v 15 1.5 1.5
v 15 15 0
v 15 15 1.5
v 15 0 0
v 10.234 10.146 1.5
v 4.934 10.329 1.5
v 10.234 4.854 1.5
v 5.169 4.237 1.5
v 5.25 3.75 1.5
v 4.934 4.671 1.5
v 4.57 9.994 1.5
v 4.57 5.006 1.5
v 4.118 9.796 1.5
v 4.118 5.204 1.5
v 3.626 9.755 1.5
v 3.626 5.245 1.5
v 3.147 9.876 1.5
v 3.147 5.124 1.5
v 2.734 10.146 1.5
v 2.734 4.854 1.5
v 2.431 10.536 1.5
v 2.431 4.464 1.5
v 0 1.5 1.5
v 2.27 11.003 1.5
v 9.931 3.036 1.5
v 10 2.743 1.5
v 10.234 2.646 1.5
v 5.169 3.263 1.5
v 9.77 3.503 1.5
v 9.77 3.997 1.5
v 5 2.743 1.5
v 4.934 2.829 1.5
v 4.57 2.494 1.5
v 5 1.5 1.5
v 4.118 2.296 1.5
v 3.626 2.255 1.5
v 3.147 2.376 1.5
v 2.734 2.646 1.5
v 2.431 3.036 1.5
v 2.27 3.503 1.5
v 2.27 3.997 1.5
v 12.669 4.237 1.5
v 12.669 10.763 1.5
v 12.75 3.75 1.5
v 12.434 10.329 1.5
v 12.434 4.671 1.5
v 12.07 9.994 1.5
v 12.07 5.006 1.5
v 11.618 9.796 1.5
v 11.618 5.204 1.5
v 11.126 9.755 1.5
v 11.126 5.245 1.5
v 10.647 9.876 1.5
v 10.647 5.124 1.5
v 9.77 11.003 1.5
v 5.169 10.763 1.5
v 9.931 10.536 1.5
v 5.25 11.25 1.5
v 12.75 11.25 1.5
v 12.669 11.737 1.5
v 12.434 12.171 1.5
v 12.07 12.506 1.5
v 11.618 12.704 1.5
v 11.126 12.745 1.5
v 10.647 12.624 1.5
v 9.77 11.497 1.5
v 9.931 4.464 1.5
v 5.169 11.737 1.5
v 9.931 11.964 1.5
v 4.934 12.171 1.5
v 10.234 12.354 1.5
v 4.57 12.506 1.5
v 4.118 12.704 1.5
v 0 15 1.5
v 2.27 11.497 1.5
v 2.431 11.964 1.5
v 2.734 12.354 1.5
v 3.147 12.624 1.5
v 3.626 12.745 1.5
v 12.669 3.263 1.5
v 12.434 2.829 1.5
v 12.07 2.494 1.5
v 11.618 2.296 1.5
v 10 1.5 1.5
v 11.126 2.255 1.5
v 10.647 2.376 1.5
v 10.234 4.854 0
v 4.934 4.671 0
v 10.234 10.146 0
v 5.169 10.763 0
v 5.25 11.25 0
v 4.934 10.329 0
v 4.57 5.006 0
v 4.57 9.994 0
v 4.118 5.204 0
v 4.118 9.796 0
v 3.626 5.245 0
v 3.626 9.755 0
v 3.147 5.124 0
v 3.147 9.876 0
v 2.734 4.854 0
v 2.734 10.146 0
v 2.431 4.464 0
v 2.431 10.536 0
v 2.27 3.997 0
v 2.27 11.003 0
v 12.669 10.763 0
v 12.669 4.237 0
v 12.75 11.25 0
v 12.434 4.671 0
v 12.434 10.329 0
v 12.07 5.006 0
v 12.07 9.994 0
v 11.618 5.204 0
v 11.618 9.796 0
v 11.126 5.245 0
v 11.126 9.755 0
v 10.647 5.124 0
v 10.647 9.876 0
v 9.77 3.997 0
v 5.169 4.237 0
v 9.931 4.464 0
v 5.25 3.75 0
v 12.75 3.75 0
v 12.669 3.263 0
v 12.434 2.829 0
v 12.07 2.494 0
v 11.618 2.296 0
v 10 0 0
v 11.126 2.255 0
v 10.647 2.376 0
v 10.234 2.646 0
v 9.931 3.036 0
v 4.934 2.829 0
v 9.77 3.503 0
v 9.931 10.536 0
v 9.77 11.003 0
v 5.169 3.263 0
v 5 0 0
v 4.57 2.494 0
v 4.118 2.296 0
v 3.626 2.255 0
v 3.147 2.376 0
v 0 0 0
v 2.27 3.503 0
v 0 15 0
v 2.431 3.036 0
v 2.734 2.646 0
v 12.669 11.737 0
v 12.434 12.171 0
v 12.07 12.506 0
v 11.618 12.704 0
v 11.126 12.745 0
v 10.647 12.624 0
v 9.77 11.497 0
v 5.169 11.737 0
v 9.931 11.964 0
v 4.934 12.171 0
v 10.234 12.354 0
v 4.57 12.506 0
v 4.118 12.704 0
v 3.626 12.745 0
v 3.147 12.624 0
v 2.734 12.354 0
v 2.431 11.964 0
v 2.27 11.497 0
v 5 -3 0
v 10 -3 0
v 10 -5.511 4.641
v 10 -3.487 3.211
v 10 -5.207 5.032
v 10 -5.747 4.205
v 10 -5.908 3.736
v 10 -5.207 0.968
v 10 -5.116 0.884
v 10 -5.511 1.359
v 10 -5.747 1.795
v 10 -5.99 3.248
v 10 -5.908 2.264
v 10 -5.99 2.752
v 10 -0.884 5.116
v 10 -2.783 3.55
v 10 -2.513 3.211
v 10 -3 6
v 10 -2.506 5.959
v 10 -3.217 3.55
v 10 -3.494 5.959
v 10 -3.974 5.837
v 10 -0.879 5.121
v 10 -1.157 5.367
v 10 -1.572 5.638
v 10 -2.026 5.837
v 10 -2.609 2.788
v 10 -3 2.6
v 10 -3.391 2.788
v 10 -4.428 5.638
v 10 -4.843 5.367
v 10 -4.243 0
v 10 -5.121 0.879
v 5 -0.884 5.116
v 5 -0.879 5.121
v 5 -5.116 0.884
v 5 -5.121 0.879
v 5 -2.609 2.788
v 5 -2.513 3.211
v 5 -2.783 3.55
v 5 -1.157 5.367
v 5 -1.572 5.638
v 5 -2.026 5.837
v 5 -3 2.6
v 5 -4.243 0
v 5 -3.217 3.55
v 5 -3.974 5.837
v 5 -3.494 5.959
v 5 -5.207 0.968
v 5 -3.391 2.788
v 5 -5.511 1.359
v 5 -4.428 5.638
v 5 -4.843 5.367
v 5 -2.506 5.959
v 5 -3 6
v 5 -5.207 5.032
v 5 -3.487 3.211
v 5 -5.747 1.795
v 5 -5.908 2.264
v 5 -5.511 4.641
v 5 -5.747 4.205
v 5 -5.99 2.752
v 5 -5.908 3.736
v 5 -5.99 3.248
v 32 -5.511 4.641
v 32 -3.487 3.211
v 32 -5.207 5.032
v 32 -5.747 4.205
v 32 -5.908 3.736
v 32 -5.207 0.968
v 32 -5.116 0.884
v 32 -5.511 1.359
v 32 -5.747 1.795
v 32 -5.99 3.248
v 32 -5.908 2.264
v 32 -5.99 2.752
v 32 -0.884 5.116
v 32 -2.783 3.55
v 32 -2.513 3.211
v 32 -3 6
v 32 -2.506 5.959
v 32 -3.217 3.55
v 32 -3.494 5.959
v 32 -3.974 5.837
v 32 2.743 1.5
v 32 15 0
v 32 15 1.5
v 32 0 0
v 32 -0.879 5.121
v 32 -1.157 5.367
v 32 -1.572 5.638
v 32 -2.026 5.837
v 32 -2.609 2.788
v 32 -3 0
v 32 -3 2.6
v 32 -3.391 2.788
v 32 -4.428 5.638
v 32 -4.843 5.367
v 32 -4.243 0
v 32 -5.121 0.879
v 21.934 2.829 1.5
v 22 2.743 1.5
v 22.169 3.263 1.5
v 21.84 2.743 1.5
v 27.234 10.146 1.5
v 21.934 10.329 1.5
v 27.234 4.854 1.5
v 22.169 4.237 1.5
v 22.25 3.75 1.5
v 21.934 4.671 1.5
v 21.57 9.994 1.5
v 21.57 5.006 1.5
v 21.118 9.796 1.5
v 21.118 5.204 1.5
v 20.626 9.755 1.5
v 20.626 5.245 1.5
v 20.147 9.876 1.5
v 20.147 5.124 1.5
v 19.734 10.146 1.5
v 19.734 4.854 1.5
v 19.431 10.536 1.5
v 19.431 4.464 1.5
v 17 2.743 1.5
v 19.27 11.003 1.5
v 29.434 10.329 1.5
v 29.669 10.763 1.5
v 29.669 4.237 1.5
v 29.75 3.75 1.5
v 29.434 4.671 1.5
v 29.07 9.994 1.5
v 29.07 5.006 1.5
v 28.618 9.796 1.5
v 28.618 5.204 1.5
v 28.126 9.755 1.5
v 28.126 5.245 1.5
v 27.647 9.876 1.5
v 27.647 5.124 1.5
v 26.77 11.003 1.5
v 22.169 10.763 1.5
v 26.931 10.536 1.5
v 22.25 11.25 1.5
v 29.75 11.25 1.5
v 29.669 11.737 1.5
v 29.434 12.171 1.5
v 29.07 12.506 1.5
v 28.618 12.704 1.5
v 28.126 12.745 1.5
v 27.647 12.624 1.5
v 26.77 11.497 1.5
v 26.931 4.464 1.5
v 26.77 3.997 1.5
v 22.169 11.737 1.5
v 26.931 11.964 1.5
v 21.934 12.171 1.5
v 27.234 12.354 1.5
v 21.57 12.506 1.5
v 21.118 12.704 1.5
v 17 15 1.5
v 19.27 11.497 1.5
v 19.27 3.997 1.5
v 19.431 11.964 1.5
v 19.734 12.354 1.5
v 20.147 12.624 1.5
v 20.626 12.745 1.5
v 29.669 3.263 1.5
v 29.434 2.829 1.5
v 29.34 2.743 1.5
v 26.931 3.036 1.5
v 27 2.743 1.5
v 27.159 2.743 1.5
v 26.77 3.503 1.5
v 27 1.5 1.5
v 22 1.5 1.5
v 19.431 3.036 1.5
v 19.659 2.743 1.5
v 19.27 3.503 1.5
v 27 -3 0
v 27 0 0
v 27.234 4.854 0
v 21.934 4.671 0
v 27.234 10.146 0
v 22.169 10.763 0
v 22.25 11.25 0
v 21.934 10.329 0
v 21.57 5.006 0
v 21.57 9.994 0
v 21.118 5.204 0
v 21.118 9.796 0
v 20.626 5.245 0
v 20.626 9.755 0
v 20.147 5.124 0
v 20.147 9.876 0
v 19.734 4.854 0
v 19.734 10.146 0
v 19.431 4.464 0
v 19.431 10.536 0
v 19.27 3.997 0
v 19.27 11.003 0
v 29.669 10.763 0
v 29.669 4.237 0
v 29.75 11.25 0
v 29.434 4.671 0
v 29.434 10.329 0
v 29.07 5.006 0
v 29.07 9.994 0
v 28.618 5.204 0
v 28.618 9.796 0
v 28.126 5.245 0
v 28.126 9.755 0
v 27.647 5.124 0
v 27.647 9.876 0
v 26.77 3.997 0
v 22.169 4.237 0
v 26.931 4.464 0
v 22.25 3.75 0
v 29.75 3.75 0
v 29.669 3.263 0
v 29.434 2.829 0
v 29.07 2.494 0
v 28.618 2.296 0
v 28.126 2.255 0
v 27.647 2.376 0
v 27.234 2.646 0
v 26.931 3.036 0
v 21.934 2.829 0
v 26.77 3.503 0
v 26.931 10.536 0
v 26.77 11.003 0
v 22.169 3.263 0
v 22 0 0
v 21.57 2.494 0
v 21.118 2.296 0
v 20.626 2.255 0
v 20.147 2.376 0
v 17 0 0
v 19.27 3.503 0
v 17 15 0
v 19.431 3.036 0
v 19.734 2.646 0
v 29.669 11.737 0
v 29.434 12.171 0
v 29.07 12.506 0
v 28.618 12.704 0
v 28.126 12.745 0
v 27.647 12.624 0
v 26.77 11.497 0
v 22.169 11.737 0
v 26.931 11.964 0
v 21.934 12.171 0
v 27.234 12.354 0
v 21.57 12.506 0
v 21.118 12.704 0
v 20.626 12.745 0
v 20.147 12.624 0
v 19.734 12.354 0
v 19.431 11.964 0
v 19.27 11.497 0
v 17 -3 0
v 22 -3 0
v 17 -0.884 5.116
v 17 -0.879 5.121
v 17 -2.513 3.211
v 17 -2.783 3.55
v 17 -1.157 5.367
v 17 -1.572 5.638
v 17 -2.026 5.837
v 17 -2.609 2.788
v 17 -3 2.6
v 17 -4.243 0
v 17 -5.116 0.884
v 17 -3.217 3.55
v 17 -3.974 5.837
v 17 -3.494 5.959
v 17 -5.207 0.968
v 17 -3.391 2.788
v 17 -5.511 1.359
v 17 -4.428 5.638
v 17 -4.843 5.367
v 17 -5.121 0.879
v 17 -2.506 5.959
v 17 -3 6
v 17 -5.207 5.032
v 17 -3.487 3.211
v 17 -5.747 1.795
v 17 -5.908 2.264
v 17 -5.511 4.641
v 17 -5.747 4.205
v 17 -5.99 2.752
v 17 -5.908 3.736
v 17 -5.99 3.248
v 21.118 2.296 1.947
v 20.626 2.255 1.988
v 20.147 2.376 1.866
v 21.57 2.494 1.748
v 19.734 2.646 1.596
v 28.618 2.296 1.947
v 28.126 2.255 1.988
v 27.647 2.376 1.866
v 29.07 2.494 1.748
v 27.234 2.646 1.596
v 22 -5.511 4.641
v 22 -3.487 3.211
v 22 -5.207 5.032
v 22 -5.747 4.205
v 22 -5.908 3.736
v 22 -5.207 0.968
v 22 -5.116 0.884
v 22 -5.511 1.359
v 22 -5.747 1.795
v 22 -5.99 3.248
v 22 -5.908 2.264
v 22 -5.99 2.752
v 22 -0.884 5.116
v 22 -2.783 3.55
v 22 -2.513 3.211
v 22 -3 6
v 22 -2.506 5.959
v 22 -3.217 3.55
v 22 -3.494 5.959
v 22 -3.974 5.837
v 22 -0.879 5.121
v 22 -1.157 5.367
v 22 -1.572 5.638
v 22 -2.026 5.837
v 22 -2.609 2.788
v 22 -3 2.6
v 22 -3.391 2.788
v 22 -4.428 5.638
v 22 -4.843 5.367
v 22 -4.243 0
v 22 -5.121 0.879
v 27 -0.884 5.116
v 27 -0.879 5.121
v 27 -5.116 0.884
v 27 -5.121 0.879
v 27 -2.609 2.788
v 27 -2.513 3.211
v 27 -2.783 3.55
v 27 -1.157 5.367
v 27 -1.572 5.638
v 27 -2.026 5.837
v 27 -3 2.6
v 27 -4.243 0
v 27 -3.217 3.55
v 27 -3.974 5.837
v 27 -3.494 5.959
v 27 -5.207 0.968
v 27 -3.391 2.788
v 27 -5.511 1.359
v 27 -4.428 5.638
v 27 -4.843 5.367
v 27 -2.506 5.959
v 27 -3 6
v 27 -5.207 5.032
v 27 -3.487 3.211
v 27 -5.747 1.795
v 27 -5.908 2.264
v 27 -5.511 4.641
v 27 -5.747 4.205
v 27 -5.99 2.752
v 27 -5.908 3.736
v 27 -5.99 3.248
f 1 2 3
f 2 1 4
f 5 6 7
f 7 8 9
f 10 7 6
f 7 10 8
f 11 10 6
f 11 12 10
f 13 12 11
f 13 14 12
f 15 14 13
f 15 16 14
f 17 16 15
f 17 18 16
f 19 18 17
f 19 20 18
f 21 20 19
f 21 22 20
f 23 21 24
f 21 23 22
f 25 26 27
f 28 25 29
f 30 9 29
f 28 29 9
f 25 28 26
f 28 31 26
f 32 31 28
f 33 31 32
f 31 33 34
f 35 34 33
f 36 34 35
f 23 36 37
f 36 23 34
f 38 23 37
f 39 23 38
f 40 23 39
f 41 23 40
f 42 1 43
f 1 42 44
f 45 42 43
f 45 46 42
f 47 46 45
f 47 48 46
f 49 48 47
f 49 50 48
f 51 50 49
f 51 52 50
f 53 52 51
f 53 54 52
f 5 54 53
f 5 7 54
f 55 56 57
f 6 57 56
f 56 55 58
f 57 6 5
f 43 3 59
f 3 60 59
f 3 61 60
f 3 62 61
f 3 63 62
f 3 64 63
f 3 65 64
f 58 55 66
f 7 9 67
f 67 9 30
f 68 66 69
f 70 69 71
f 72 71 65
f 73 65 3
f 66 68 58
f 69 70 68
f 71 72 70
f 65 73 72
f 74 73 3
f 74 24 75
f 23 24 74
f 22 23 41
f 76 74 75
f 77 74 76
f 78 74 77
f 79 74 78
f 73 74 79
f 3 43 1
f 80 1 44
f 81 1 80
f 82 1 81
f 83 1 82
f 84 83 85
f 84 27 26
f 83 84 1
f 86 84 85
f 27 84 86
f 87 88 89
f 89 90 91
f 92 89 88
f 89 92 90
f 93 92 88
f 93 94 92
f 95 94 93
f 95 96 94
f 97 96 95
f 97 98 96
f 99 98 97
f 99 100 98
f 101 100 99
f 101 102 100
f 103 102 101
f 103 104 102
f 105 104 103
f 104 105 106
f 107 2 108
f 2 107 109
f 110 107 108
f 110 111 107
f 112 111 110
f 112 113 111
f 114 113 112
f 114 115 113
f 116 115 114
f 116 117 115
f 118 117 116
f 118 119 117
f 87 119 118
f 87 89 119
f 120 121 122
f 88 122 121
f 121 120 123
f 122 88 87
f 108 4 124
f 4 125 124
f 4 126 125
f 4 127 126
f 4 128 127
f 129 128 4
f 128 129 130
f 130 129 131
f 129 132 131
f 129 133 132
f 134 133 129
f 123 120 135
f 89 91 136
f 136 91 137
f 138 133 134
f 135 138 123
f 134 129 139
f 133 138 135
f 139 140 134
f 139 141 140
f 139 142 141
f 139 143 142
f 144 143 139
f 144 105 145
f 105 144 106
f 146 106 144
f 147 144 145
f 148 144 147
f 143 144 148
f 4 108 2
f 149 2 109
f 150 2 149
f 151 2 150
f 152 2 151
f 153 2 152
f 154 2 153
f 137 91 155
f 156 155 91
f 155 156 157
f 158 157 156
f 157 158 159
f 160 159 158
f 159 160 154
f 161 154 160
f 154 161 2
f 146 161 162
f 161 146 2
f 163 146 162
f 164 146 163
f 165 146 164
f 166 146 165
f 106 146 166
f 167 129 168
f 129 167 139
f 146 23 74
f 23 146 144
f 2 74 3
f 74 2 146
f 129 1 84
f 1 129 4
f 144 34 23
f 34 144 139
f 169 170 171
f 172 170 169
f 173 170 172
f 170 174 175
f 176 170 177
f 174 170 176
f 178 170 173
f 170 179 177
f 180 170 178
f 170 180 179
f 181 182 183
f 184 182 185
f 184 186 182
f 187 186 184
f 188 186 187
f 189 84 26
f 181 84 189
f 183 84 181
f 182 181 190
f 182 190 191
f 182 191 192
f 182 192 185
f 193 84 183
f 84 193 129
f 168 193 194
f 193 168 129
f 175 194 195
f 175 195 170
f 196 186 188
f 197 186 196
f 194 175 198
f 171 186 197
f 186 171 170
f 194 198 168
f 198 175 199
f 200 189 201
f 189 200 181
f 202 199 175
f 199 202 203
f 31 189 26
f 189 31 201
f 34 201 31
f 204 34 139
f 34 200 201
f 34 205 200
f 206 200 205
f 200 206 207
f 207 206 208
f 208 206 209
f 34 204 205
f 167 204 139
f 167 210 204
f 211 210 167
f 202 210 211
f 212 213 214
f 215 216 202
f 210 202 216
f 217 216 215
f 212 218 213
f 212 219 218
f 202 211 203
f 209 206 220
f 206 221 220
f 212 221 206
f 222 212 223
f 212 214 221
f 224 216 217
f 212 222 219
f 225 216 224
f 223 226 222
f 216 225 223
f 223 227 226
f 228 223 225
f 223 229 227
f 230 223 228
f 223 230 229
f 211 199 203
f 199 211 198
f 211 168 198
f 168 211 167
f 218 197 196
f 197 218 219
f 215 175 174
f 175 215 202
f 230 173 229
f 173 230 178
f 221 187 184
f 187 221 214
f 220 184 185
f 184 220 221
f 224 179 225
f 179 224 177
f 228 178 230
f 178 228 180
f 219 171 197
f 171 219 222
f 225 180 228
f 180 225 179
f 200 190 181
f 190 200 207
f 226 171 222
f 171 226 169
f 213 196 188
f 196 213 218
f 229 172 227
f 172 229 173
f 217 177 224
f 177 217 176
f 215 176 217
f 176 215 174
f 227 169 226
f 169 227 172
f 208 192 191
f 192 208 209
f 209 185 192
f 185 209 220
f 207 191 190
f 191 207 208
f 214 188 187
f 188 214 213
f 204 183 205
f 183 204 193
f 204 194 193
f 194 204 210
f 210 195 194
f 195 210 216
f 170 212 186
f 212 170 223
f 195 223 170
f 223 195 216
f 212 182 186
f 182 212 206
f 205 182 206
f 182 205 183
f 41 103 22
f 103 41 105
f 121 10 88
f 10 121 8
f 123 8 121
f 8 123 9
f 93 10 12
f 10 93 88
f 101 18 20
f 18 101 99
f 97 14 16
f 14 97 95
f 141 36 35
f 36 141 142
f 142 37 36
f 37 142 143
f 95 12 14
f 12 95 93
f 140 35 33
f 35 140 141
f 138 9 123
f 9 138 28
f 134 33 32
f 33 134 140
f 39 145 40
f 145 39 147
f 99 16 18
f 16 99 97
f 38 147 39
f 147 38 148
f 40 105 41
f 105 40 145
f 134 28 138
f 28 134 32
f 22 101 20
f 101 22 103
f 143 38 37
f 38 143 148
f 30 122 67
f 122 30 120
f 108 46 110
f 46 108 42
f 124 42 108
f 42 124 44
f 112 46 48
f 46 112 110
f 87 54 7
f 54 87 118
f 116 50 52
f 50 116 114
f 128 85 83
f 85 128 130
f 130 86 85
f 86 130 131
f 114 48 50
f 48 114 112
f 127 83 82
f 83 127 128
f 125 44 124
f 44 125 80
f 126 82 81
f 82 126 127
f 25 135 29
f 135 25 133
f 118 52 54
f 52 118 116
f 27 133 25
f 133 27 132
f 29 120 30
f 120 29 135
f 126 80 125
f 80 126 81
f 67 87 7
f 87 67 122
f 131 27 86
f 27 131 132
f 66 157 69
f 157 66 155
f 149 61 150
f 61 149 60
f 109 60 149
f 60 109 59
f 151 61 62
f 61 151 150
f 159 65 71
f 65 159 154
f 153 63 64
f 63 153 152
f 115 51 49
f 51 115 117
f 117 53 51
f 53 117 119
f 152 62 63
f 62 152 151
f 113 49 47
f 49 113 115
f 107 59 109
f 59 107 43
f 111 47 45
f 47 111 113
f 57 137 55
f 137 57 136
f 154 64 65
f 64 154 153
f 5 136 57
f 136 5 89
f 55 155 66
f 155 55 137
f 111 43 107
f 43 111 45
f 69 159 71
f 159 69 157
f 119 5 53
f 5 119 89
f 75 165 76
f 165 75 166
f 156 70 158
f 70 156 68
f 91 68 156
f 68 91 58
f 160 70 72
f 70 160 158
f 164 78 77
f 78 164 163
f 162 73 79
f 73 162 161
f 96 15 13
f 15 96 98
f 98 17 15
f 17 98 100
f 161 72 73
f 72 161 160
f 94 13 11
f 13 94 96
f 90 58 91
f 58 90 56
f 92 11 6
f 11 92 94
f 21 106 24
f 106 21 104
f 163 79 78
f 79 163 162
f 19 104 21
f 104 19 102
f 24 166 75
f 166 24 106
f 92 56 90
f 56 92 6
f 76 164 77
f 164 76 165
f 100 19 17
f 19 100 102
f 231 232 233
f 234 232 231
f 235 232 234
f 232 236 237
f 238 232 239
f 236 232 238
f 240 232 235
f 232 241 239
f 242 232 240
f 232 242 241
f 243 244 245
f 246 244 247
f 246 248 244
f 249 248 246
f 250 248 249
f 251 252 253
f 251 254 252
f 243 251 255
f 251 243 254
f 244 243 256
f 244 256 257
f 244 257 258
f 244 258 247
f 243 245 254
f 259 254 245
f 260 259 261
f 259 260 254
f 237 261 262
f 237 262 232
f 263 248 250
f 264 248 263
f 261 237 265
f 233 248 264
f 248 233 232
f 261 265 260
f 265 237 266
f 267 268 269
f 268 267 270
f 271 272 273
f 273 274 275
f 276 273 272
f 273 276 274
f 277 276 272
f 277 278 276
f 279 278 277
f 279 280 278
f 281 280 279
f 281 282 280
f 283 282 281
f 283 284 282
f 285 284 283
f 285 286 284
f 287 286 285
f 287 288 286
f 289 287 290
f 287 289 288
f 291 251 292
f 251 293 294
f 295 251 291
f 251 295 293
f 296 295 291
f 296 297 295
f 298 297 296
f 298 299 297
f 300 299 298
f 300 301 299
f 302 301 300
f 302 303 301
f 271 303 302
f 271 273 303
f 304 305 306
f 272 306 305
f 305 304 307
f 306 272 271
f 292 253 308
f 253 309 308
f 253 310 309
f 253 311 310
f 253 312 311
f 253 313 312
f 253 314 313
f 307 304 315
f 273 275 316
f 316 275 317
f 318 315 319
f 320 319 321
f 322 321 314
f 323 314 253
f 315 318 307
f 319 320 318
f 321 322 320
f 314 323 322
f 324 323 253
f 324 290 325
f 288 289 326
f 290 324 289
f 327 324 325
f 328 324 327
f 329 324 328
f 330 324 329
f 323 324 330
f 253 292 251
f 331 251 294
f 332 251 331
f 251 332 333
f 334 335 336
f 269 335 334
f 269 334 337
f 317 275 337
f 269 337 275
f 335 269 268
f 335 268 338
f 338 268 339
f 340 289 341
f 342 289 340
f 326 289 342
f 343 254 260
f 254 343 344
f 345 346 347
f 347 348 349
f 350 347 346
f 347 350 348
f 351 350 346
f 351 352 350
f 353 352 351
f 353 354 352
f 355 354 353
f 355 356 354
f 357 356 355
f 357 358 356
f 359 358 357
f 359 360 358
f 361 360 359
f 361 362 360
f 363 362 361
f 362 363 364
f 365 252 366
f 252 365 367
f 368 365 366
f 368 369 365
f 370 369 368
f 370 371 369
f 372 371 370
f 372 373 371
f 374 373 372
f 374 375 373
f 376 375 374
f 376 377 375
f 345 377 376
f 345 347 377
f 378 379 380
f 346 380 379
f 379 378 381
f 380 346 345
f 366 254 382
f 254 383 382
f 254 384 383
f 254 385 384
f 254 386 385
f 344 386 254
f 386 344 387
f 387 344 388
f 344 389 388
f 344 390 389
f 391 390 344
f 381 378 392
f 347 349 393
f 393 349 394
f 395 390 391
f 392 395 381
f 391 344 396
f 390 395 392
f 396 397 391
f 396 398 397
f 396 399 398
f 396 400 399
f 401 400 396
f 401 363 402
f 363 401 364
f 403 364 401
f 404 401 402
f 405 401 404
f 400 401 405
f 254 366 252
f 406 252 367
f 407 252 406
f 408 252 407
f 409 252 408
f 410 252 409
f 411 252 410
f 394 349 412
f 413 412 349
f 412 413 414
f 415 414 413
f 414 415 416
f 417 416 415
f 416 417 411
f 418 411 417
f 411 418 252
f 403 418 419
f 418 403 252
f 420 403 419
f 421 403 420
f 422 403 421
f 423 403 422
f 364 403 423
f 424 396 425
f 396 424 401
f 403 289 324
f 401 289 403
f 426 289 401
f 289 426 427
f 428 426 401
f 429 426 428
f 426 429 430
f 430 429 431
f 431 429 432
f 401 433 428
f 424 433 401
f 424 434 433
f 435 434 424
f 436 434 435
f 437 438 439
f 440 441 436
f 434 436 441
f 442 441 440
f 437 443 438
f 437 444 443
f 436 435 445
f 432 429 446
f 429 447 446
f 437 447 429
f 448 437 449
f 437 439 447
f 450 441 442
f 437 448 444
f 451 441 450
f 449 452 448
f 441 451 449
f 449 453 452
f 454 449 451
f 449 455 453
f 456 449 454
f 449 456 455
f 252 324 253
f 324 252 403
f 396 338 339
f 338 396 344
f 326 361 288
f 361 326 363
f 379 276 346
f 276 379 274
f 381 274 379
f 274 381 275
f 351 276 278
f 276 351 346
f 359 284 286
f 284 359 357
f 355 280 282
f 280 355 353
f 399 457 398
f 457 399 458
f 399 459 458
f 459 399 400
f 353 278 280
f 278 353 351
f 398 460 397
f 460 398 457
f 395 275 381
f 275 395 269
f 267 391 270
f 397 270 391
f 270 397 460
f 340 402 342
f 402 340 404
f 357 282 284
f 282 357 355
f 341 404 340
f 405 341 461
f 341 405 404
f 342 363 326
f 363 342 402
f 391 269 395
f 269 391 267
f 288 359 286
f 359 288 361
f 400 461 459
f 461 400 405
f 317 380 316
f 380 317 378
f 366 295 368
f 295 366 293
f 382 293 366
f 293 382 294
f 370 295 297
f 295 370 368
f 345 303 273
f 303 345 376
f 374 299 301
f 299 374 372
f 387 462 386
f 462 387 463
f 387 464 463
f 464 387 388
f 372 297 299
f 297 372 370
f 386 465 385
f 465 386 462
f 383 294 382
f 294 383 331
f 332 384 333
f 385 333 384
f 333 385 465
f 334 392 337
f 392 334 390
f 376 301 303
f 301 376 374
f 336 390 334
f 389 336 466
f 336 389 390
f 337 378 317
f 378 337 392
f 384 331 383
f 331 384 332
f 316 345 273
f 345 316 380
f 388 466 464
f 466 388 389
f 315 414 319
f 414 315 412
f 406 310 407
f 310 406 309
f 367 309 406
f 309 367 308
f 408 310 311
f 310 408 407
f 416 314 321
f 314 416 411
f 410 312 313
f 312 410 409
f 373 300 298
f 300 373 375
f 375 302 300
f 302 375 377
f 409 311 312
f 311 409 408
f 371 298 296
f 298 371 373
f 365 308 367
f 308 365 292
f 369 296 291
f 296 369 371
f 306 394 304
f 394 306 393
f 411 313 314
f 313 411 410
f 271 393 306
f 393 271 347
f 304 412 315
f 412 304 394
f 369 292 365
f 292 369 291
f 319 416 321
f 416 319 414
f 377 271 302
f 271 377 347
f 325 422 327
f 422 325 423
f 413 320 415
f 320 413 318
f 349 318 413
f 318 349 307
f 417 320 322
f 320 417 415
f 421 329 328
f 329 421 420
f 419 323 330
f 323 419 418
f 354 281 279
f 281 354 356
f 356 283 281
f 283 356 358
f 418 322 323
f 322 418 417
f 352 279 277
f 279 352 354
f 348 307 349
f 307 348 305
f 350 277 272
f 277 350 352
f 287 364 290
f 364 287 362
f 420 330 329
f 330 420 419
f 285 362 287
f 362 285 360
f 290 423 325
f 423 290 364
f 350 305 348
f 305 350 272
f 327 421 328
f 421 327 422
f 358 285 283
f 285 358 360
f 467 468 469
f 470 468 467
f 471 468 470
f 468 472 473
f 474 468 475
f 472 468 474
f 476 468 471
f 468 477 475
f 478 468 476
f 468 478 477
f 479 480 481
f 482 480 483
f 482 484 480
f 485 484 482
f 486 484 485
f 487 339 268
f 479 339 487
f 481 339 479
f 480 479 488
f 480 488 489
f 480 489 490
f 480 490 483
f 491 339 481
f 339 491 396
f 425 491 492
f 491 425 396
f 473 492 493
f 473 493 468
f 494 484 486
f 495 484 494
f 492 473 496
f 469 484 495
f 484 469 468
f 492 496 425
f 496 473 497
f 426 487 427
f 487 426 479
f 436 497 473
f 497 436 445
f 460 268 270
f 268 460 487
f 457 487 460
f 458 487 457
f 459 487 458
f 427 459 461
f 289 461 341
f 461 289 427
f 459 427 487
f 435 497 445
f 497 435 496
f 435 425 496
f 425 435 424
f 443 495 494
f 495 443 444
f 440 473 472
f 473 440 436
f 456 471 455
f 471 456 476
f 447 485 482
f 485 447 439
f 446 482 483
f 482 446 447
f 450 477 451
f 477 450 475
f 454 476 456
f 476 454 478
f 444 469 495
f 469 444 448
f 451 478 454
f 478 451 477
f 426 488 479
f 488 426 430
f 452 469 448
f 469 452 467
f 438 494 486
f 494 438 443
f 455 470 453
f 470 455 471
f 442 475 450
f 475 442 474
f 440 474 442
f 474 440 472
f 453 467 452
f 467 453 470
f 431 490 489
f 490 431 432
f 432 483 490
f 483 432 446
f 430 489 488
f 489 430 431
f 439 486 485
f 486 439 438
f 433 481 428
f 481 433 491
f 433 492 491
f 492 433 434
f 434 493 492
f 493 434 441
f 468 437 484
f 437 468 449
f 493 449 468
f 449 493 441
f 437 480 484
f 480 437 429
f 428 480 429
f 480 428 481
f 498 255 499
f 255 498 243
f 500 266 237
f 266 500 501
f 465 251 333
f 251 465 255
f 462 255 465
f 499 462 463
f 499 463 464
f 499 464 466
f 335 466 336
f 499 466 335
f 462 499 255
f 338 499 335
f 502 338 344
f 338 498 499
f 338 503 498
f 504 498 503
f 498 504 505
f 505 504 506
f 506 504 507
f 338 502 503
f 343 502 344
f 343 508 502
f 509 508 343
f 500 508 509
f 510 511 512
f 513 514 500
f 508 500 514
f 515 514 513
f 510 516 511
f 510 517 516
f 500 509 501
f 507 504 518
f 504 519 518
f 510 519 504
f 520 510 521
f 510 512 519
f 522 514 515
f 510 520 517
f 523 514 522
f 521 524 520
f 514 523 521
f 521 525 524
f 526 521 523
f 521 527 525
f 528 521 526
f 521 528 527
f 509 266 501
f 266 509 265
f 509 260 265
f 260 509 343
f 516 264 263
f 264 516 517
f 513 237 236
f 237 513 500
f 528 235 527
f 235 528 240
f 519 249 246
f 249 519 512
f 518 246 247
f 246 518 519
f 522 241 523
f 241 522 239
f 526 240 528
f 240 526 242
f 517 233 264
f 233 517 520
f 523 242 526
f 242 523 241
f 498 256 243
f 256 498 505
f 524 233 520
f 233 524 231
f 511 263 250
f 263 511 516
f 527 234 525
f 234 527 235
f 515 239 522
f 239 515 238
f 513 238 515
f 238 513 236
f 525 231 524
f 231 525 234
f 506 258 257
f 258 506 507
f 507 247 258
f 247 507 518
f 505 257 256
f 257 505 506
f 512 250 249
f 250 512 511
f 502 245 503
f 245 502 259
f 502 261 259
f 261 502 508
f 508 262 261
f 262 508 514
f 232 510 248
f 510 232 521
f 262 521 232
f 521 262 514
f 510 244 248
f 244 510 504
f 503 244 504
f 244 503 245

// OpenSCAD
plate_width=15;
plate_length=15;
plate_thickness=1.5;
pin_diameter=1;
pin_surround=2.5;
glue_hole_diameter=3;
hinge_radius=(pin_diameter+(pin_surround*2))/2;
hinge_thickness=plate_width/3;

$fa=.5;
$fs=.5;

module base(){
	cube([plate_width,plate_length,plate_thickness]);}
module glue_holes(){
	translate([plate_width/4,plate_length/4,-0.1]){
		#cylinder(r=glue_hole_diameter/2,h=plate_thickness+2);
	}
	translate([plate_width/4*3,plate_length/4,-0.1]){
		#cylinder(r=glue_hole_diameter/2,h=plate_thickness+2);
	}
	translate([plate_width/4*3,plate_length/4*3,-0.1]){
		#cylinder(r=glue_hole_diameter/2,h=plate_thickness+2);
	}
	translate([plate_width/4,plate_length/4*3,-0.1]){
		#cylinder(r=glue_hole_diameter/2,h=plate_thickness+2);
	}
}
module hinge(){
	translate([hinge_thickness,-hinge_radius,hinge_radius]){
		rotate([0,90,0]){
			difference(){
				union(){
					cylinder(r=hinge_radius,h=hinge_thickness);
					difference(){
						rotate([0,0,45]){
							translate([0,-hinge_radius,0]){
							cube([hinge_radius*4.5,hinge_radius*2,hinge_thickness]);
							}
						}
						translate([hinge_radius,-hinge_radius,-hinge_thickness]){
							#cube([30,30,30]);
						}
					}
				}
				translate([-.1,0,0]){
					#cylinder(r=pin_diameter/2,h=hinge_thickness+.2);
				}
			}
		}
	}
}

difference(){
	union(){
		difference(){
			cube([plate_width,plate_length,plate_thickness]);
			rotate([45,0,0]){
				cube(plate_width,30,-30);
			}
		}	
		hinge();
	}
	glue_holes();
}

translate([plate_width+2,0,0]){
	difference(){
		union(){
			difference(){
			cube([plate_width,plate_length,plate_thickness]);
			rotate([45,0,0]){
				cube(plate_width,30,-30);
			}
		}
			translate([-plate_width/3,0,0]){
				hinge();
			}
			translate([plate_width/3,0,0]){
				hinge();
			}
		}
		glue_holes();
	}
	
}
